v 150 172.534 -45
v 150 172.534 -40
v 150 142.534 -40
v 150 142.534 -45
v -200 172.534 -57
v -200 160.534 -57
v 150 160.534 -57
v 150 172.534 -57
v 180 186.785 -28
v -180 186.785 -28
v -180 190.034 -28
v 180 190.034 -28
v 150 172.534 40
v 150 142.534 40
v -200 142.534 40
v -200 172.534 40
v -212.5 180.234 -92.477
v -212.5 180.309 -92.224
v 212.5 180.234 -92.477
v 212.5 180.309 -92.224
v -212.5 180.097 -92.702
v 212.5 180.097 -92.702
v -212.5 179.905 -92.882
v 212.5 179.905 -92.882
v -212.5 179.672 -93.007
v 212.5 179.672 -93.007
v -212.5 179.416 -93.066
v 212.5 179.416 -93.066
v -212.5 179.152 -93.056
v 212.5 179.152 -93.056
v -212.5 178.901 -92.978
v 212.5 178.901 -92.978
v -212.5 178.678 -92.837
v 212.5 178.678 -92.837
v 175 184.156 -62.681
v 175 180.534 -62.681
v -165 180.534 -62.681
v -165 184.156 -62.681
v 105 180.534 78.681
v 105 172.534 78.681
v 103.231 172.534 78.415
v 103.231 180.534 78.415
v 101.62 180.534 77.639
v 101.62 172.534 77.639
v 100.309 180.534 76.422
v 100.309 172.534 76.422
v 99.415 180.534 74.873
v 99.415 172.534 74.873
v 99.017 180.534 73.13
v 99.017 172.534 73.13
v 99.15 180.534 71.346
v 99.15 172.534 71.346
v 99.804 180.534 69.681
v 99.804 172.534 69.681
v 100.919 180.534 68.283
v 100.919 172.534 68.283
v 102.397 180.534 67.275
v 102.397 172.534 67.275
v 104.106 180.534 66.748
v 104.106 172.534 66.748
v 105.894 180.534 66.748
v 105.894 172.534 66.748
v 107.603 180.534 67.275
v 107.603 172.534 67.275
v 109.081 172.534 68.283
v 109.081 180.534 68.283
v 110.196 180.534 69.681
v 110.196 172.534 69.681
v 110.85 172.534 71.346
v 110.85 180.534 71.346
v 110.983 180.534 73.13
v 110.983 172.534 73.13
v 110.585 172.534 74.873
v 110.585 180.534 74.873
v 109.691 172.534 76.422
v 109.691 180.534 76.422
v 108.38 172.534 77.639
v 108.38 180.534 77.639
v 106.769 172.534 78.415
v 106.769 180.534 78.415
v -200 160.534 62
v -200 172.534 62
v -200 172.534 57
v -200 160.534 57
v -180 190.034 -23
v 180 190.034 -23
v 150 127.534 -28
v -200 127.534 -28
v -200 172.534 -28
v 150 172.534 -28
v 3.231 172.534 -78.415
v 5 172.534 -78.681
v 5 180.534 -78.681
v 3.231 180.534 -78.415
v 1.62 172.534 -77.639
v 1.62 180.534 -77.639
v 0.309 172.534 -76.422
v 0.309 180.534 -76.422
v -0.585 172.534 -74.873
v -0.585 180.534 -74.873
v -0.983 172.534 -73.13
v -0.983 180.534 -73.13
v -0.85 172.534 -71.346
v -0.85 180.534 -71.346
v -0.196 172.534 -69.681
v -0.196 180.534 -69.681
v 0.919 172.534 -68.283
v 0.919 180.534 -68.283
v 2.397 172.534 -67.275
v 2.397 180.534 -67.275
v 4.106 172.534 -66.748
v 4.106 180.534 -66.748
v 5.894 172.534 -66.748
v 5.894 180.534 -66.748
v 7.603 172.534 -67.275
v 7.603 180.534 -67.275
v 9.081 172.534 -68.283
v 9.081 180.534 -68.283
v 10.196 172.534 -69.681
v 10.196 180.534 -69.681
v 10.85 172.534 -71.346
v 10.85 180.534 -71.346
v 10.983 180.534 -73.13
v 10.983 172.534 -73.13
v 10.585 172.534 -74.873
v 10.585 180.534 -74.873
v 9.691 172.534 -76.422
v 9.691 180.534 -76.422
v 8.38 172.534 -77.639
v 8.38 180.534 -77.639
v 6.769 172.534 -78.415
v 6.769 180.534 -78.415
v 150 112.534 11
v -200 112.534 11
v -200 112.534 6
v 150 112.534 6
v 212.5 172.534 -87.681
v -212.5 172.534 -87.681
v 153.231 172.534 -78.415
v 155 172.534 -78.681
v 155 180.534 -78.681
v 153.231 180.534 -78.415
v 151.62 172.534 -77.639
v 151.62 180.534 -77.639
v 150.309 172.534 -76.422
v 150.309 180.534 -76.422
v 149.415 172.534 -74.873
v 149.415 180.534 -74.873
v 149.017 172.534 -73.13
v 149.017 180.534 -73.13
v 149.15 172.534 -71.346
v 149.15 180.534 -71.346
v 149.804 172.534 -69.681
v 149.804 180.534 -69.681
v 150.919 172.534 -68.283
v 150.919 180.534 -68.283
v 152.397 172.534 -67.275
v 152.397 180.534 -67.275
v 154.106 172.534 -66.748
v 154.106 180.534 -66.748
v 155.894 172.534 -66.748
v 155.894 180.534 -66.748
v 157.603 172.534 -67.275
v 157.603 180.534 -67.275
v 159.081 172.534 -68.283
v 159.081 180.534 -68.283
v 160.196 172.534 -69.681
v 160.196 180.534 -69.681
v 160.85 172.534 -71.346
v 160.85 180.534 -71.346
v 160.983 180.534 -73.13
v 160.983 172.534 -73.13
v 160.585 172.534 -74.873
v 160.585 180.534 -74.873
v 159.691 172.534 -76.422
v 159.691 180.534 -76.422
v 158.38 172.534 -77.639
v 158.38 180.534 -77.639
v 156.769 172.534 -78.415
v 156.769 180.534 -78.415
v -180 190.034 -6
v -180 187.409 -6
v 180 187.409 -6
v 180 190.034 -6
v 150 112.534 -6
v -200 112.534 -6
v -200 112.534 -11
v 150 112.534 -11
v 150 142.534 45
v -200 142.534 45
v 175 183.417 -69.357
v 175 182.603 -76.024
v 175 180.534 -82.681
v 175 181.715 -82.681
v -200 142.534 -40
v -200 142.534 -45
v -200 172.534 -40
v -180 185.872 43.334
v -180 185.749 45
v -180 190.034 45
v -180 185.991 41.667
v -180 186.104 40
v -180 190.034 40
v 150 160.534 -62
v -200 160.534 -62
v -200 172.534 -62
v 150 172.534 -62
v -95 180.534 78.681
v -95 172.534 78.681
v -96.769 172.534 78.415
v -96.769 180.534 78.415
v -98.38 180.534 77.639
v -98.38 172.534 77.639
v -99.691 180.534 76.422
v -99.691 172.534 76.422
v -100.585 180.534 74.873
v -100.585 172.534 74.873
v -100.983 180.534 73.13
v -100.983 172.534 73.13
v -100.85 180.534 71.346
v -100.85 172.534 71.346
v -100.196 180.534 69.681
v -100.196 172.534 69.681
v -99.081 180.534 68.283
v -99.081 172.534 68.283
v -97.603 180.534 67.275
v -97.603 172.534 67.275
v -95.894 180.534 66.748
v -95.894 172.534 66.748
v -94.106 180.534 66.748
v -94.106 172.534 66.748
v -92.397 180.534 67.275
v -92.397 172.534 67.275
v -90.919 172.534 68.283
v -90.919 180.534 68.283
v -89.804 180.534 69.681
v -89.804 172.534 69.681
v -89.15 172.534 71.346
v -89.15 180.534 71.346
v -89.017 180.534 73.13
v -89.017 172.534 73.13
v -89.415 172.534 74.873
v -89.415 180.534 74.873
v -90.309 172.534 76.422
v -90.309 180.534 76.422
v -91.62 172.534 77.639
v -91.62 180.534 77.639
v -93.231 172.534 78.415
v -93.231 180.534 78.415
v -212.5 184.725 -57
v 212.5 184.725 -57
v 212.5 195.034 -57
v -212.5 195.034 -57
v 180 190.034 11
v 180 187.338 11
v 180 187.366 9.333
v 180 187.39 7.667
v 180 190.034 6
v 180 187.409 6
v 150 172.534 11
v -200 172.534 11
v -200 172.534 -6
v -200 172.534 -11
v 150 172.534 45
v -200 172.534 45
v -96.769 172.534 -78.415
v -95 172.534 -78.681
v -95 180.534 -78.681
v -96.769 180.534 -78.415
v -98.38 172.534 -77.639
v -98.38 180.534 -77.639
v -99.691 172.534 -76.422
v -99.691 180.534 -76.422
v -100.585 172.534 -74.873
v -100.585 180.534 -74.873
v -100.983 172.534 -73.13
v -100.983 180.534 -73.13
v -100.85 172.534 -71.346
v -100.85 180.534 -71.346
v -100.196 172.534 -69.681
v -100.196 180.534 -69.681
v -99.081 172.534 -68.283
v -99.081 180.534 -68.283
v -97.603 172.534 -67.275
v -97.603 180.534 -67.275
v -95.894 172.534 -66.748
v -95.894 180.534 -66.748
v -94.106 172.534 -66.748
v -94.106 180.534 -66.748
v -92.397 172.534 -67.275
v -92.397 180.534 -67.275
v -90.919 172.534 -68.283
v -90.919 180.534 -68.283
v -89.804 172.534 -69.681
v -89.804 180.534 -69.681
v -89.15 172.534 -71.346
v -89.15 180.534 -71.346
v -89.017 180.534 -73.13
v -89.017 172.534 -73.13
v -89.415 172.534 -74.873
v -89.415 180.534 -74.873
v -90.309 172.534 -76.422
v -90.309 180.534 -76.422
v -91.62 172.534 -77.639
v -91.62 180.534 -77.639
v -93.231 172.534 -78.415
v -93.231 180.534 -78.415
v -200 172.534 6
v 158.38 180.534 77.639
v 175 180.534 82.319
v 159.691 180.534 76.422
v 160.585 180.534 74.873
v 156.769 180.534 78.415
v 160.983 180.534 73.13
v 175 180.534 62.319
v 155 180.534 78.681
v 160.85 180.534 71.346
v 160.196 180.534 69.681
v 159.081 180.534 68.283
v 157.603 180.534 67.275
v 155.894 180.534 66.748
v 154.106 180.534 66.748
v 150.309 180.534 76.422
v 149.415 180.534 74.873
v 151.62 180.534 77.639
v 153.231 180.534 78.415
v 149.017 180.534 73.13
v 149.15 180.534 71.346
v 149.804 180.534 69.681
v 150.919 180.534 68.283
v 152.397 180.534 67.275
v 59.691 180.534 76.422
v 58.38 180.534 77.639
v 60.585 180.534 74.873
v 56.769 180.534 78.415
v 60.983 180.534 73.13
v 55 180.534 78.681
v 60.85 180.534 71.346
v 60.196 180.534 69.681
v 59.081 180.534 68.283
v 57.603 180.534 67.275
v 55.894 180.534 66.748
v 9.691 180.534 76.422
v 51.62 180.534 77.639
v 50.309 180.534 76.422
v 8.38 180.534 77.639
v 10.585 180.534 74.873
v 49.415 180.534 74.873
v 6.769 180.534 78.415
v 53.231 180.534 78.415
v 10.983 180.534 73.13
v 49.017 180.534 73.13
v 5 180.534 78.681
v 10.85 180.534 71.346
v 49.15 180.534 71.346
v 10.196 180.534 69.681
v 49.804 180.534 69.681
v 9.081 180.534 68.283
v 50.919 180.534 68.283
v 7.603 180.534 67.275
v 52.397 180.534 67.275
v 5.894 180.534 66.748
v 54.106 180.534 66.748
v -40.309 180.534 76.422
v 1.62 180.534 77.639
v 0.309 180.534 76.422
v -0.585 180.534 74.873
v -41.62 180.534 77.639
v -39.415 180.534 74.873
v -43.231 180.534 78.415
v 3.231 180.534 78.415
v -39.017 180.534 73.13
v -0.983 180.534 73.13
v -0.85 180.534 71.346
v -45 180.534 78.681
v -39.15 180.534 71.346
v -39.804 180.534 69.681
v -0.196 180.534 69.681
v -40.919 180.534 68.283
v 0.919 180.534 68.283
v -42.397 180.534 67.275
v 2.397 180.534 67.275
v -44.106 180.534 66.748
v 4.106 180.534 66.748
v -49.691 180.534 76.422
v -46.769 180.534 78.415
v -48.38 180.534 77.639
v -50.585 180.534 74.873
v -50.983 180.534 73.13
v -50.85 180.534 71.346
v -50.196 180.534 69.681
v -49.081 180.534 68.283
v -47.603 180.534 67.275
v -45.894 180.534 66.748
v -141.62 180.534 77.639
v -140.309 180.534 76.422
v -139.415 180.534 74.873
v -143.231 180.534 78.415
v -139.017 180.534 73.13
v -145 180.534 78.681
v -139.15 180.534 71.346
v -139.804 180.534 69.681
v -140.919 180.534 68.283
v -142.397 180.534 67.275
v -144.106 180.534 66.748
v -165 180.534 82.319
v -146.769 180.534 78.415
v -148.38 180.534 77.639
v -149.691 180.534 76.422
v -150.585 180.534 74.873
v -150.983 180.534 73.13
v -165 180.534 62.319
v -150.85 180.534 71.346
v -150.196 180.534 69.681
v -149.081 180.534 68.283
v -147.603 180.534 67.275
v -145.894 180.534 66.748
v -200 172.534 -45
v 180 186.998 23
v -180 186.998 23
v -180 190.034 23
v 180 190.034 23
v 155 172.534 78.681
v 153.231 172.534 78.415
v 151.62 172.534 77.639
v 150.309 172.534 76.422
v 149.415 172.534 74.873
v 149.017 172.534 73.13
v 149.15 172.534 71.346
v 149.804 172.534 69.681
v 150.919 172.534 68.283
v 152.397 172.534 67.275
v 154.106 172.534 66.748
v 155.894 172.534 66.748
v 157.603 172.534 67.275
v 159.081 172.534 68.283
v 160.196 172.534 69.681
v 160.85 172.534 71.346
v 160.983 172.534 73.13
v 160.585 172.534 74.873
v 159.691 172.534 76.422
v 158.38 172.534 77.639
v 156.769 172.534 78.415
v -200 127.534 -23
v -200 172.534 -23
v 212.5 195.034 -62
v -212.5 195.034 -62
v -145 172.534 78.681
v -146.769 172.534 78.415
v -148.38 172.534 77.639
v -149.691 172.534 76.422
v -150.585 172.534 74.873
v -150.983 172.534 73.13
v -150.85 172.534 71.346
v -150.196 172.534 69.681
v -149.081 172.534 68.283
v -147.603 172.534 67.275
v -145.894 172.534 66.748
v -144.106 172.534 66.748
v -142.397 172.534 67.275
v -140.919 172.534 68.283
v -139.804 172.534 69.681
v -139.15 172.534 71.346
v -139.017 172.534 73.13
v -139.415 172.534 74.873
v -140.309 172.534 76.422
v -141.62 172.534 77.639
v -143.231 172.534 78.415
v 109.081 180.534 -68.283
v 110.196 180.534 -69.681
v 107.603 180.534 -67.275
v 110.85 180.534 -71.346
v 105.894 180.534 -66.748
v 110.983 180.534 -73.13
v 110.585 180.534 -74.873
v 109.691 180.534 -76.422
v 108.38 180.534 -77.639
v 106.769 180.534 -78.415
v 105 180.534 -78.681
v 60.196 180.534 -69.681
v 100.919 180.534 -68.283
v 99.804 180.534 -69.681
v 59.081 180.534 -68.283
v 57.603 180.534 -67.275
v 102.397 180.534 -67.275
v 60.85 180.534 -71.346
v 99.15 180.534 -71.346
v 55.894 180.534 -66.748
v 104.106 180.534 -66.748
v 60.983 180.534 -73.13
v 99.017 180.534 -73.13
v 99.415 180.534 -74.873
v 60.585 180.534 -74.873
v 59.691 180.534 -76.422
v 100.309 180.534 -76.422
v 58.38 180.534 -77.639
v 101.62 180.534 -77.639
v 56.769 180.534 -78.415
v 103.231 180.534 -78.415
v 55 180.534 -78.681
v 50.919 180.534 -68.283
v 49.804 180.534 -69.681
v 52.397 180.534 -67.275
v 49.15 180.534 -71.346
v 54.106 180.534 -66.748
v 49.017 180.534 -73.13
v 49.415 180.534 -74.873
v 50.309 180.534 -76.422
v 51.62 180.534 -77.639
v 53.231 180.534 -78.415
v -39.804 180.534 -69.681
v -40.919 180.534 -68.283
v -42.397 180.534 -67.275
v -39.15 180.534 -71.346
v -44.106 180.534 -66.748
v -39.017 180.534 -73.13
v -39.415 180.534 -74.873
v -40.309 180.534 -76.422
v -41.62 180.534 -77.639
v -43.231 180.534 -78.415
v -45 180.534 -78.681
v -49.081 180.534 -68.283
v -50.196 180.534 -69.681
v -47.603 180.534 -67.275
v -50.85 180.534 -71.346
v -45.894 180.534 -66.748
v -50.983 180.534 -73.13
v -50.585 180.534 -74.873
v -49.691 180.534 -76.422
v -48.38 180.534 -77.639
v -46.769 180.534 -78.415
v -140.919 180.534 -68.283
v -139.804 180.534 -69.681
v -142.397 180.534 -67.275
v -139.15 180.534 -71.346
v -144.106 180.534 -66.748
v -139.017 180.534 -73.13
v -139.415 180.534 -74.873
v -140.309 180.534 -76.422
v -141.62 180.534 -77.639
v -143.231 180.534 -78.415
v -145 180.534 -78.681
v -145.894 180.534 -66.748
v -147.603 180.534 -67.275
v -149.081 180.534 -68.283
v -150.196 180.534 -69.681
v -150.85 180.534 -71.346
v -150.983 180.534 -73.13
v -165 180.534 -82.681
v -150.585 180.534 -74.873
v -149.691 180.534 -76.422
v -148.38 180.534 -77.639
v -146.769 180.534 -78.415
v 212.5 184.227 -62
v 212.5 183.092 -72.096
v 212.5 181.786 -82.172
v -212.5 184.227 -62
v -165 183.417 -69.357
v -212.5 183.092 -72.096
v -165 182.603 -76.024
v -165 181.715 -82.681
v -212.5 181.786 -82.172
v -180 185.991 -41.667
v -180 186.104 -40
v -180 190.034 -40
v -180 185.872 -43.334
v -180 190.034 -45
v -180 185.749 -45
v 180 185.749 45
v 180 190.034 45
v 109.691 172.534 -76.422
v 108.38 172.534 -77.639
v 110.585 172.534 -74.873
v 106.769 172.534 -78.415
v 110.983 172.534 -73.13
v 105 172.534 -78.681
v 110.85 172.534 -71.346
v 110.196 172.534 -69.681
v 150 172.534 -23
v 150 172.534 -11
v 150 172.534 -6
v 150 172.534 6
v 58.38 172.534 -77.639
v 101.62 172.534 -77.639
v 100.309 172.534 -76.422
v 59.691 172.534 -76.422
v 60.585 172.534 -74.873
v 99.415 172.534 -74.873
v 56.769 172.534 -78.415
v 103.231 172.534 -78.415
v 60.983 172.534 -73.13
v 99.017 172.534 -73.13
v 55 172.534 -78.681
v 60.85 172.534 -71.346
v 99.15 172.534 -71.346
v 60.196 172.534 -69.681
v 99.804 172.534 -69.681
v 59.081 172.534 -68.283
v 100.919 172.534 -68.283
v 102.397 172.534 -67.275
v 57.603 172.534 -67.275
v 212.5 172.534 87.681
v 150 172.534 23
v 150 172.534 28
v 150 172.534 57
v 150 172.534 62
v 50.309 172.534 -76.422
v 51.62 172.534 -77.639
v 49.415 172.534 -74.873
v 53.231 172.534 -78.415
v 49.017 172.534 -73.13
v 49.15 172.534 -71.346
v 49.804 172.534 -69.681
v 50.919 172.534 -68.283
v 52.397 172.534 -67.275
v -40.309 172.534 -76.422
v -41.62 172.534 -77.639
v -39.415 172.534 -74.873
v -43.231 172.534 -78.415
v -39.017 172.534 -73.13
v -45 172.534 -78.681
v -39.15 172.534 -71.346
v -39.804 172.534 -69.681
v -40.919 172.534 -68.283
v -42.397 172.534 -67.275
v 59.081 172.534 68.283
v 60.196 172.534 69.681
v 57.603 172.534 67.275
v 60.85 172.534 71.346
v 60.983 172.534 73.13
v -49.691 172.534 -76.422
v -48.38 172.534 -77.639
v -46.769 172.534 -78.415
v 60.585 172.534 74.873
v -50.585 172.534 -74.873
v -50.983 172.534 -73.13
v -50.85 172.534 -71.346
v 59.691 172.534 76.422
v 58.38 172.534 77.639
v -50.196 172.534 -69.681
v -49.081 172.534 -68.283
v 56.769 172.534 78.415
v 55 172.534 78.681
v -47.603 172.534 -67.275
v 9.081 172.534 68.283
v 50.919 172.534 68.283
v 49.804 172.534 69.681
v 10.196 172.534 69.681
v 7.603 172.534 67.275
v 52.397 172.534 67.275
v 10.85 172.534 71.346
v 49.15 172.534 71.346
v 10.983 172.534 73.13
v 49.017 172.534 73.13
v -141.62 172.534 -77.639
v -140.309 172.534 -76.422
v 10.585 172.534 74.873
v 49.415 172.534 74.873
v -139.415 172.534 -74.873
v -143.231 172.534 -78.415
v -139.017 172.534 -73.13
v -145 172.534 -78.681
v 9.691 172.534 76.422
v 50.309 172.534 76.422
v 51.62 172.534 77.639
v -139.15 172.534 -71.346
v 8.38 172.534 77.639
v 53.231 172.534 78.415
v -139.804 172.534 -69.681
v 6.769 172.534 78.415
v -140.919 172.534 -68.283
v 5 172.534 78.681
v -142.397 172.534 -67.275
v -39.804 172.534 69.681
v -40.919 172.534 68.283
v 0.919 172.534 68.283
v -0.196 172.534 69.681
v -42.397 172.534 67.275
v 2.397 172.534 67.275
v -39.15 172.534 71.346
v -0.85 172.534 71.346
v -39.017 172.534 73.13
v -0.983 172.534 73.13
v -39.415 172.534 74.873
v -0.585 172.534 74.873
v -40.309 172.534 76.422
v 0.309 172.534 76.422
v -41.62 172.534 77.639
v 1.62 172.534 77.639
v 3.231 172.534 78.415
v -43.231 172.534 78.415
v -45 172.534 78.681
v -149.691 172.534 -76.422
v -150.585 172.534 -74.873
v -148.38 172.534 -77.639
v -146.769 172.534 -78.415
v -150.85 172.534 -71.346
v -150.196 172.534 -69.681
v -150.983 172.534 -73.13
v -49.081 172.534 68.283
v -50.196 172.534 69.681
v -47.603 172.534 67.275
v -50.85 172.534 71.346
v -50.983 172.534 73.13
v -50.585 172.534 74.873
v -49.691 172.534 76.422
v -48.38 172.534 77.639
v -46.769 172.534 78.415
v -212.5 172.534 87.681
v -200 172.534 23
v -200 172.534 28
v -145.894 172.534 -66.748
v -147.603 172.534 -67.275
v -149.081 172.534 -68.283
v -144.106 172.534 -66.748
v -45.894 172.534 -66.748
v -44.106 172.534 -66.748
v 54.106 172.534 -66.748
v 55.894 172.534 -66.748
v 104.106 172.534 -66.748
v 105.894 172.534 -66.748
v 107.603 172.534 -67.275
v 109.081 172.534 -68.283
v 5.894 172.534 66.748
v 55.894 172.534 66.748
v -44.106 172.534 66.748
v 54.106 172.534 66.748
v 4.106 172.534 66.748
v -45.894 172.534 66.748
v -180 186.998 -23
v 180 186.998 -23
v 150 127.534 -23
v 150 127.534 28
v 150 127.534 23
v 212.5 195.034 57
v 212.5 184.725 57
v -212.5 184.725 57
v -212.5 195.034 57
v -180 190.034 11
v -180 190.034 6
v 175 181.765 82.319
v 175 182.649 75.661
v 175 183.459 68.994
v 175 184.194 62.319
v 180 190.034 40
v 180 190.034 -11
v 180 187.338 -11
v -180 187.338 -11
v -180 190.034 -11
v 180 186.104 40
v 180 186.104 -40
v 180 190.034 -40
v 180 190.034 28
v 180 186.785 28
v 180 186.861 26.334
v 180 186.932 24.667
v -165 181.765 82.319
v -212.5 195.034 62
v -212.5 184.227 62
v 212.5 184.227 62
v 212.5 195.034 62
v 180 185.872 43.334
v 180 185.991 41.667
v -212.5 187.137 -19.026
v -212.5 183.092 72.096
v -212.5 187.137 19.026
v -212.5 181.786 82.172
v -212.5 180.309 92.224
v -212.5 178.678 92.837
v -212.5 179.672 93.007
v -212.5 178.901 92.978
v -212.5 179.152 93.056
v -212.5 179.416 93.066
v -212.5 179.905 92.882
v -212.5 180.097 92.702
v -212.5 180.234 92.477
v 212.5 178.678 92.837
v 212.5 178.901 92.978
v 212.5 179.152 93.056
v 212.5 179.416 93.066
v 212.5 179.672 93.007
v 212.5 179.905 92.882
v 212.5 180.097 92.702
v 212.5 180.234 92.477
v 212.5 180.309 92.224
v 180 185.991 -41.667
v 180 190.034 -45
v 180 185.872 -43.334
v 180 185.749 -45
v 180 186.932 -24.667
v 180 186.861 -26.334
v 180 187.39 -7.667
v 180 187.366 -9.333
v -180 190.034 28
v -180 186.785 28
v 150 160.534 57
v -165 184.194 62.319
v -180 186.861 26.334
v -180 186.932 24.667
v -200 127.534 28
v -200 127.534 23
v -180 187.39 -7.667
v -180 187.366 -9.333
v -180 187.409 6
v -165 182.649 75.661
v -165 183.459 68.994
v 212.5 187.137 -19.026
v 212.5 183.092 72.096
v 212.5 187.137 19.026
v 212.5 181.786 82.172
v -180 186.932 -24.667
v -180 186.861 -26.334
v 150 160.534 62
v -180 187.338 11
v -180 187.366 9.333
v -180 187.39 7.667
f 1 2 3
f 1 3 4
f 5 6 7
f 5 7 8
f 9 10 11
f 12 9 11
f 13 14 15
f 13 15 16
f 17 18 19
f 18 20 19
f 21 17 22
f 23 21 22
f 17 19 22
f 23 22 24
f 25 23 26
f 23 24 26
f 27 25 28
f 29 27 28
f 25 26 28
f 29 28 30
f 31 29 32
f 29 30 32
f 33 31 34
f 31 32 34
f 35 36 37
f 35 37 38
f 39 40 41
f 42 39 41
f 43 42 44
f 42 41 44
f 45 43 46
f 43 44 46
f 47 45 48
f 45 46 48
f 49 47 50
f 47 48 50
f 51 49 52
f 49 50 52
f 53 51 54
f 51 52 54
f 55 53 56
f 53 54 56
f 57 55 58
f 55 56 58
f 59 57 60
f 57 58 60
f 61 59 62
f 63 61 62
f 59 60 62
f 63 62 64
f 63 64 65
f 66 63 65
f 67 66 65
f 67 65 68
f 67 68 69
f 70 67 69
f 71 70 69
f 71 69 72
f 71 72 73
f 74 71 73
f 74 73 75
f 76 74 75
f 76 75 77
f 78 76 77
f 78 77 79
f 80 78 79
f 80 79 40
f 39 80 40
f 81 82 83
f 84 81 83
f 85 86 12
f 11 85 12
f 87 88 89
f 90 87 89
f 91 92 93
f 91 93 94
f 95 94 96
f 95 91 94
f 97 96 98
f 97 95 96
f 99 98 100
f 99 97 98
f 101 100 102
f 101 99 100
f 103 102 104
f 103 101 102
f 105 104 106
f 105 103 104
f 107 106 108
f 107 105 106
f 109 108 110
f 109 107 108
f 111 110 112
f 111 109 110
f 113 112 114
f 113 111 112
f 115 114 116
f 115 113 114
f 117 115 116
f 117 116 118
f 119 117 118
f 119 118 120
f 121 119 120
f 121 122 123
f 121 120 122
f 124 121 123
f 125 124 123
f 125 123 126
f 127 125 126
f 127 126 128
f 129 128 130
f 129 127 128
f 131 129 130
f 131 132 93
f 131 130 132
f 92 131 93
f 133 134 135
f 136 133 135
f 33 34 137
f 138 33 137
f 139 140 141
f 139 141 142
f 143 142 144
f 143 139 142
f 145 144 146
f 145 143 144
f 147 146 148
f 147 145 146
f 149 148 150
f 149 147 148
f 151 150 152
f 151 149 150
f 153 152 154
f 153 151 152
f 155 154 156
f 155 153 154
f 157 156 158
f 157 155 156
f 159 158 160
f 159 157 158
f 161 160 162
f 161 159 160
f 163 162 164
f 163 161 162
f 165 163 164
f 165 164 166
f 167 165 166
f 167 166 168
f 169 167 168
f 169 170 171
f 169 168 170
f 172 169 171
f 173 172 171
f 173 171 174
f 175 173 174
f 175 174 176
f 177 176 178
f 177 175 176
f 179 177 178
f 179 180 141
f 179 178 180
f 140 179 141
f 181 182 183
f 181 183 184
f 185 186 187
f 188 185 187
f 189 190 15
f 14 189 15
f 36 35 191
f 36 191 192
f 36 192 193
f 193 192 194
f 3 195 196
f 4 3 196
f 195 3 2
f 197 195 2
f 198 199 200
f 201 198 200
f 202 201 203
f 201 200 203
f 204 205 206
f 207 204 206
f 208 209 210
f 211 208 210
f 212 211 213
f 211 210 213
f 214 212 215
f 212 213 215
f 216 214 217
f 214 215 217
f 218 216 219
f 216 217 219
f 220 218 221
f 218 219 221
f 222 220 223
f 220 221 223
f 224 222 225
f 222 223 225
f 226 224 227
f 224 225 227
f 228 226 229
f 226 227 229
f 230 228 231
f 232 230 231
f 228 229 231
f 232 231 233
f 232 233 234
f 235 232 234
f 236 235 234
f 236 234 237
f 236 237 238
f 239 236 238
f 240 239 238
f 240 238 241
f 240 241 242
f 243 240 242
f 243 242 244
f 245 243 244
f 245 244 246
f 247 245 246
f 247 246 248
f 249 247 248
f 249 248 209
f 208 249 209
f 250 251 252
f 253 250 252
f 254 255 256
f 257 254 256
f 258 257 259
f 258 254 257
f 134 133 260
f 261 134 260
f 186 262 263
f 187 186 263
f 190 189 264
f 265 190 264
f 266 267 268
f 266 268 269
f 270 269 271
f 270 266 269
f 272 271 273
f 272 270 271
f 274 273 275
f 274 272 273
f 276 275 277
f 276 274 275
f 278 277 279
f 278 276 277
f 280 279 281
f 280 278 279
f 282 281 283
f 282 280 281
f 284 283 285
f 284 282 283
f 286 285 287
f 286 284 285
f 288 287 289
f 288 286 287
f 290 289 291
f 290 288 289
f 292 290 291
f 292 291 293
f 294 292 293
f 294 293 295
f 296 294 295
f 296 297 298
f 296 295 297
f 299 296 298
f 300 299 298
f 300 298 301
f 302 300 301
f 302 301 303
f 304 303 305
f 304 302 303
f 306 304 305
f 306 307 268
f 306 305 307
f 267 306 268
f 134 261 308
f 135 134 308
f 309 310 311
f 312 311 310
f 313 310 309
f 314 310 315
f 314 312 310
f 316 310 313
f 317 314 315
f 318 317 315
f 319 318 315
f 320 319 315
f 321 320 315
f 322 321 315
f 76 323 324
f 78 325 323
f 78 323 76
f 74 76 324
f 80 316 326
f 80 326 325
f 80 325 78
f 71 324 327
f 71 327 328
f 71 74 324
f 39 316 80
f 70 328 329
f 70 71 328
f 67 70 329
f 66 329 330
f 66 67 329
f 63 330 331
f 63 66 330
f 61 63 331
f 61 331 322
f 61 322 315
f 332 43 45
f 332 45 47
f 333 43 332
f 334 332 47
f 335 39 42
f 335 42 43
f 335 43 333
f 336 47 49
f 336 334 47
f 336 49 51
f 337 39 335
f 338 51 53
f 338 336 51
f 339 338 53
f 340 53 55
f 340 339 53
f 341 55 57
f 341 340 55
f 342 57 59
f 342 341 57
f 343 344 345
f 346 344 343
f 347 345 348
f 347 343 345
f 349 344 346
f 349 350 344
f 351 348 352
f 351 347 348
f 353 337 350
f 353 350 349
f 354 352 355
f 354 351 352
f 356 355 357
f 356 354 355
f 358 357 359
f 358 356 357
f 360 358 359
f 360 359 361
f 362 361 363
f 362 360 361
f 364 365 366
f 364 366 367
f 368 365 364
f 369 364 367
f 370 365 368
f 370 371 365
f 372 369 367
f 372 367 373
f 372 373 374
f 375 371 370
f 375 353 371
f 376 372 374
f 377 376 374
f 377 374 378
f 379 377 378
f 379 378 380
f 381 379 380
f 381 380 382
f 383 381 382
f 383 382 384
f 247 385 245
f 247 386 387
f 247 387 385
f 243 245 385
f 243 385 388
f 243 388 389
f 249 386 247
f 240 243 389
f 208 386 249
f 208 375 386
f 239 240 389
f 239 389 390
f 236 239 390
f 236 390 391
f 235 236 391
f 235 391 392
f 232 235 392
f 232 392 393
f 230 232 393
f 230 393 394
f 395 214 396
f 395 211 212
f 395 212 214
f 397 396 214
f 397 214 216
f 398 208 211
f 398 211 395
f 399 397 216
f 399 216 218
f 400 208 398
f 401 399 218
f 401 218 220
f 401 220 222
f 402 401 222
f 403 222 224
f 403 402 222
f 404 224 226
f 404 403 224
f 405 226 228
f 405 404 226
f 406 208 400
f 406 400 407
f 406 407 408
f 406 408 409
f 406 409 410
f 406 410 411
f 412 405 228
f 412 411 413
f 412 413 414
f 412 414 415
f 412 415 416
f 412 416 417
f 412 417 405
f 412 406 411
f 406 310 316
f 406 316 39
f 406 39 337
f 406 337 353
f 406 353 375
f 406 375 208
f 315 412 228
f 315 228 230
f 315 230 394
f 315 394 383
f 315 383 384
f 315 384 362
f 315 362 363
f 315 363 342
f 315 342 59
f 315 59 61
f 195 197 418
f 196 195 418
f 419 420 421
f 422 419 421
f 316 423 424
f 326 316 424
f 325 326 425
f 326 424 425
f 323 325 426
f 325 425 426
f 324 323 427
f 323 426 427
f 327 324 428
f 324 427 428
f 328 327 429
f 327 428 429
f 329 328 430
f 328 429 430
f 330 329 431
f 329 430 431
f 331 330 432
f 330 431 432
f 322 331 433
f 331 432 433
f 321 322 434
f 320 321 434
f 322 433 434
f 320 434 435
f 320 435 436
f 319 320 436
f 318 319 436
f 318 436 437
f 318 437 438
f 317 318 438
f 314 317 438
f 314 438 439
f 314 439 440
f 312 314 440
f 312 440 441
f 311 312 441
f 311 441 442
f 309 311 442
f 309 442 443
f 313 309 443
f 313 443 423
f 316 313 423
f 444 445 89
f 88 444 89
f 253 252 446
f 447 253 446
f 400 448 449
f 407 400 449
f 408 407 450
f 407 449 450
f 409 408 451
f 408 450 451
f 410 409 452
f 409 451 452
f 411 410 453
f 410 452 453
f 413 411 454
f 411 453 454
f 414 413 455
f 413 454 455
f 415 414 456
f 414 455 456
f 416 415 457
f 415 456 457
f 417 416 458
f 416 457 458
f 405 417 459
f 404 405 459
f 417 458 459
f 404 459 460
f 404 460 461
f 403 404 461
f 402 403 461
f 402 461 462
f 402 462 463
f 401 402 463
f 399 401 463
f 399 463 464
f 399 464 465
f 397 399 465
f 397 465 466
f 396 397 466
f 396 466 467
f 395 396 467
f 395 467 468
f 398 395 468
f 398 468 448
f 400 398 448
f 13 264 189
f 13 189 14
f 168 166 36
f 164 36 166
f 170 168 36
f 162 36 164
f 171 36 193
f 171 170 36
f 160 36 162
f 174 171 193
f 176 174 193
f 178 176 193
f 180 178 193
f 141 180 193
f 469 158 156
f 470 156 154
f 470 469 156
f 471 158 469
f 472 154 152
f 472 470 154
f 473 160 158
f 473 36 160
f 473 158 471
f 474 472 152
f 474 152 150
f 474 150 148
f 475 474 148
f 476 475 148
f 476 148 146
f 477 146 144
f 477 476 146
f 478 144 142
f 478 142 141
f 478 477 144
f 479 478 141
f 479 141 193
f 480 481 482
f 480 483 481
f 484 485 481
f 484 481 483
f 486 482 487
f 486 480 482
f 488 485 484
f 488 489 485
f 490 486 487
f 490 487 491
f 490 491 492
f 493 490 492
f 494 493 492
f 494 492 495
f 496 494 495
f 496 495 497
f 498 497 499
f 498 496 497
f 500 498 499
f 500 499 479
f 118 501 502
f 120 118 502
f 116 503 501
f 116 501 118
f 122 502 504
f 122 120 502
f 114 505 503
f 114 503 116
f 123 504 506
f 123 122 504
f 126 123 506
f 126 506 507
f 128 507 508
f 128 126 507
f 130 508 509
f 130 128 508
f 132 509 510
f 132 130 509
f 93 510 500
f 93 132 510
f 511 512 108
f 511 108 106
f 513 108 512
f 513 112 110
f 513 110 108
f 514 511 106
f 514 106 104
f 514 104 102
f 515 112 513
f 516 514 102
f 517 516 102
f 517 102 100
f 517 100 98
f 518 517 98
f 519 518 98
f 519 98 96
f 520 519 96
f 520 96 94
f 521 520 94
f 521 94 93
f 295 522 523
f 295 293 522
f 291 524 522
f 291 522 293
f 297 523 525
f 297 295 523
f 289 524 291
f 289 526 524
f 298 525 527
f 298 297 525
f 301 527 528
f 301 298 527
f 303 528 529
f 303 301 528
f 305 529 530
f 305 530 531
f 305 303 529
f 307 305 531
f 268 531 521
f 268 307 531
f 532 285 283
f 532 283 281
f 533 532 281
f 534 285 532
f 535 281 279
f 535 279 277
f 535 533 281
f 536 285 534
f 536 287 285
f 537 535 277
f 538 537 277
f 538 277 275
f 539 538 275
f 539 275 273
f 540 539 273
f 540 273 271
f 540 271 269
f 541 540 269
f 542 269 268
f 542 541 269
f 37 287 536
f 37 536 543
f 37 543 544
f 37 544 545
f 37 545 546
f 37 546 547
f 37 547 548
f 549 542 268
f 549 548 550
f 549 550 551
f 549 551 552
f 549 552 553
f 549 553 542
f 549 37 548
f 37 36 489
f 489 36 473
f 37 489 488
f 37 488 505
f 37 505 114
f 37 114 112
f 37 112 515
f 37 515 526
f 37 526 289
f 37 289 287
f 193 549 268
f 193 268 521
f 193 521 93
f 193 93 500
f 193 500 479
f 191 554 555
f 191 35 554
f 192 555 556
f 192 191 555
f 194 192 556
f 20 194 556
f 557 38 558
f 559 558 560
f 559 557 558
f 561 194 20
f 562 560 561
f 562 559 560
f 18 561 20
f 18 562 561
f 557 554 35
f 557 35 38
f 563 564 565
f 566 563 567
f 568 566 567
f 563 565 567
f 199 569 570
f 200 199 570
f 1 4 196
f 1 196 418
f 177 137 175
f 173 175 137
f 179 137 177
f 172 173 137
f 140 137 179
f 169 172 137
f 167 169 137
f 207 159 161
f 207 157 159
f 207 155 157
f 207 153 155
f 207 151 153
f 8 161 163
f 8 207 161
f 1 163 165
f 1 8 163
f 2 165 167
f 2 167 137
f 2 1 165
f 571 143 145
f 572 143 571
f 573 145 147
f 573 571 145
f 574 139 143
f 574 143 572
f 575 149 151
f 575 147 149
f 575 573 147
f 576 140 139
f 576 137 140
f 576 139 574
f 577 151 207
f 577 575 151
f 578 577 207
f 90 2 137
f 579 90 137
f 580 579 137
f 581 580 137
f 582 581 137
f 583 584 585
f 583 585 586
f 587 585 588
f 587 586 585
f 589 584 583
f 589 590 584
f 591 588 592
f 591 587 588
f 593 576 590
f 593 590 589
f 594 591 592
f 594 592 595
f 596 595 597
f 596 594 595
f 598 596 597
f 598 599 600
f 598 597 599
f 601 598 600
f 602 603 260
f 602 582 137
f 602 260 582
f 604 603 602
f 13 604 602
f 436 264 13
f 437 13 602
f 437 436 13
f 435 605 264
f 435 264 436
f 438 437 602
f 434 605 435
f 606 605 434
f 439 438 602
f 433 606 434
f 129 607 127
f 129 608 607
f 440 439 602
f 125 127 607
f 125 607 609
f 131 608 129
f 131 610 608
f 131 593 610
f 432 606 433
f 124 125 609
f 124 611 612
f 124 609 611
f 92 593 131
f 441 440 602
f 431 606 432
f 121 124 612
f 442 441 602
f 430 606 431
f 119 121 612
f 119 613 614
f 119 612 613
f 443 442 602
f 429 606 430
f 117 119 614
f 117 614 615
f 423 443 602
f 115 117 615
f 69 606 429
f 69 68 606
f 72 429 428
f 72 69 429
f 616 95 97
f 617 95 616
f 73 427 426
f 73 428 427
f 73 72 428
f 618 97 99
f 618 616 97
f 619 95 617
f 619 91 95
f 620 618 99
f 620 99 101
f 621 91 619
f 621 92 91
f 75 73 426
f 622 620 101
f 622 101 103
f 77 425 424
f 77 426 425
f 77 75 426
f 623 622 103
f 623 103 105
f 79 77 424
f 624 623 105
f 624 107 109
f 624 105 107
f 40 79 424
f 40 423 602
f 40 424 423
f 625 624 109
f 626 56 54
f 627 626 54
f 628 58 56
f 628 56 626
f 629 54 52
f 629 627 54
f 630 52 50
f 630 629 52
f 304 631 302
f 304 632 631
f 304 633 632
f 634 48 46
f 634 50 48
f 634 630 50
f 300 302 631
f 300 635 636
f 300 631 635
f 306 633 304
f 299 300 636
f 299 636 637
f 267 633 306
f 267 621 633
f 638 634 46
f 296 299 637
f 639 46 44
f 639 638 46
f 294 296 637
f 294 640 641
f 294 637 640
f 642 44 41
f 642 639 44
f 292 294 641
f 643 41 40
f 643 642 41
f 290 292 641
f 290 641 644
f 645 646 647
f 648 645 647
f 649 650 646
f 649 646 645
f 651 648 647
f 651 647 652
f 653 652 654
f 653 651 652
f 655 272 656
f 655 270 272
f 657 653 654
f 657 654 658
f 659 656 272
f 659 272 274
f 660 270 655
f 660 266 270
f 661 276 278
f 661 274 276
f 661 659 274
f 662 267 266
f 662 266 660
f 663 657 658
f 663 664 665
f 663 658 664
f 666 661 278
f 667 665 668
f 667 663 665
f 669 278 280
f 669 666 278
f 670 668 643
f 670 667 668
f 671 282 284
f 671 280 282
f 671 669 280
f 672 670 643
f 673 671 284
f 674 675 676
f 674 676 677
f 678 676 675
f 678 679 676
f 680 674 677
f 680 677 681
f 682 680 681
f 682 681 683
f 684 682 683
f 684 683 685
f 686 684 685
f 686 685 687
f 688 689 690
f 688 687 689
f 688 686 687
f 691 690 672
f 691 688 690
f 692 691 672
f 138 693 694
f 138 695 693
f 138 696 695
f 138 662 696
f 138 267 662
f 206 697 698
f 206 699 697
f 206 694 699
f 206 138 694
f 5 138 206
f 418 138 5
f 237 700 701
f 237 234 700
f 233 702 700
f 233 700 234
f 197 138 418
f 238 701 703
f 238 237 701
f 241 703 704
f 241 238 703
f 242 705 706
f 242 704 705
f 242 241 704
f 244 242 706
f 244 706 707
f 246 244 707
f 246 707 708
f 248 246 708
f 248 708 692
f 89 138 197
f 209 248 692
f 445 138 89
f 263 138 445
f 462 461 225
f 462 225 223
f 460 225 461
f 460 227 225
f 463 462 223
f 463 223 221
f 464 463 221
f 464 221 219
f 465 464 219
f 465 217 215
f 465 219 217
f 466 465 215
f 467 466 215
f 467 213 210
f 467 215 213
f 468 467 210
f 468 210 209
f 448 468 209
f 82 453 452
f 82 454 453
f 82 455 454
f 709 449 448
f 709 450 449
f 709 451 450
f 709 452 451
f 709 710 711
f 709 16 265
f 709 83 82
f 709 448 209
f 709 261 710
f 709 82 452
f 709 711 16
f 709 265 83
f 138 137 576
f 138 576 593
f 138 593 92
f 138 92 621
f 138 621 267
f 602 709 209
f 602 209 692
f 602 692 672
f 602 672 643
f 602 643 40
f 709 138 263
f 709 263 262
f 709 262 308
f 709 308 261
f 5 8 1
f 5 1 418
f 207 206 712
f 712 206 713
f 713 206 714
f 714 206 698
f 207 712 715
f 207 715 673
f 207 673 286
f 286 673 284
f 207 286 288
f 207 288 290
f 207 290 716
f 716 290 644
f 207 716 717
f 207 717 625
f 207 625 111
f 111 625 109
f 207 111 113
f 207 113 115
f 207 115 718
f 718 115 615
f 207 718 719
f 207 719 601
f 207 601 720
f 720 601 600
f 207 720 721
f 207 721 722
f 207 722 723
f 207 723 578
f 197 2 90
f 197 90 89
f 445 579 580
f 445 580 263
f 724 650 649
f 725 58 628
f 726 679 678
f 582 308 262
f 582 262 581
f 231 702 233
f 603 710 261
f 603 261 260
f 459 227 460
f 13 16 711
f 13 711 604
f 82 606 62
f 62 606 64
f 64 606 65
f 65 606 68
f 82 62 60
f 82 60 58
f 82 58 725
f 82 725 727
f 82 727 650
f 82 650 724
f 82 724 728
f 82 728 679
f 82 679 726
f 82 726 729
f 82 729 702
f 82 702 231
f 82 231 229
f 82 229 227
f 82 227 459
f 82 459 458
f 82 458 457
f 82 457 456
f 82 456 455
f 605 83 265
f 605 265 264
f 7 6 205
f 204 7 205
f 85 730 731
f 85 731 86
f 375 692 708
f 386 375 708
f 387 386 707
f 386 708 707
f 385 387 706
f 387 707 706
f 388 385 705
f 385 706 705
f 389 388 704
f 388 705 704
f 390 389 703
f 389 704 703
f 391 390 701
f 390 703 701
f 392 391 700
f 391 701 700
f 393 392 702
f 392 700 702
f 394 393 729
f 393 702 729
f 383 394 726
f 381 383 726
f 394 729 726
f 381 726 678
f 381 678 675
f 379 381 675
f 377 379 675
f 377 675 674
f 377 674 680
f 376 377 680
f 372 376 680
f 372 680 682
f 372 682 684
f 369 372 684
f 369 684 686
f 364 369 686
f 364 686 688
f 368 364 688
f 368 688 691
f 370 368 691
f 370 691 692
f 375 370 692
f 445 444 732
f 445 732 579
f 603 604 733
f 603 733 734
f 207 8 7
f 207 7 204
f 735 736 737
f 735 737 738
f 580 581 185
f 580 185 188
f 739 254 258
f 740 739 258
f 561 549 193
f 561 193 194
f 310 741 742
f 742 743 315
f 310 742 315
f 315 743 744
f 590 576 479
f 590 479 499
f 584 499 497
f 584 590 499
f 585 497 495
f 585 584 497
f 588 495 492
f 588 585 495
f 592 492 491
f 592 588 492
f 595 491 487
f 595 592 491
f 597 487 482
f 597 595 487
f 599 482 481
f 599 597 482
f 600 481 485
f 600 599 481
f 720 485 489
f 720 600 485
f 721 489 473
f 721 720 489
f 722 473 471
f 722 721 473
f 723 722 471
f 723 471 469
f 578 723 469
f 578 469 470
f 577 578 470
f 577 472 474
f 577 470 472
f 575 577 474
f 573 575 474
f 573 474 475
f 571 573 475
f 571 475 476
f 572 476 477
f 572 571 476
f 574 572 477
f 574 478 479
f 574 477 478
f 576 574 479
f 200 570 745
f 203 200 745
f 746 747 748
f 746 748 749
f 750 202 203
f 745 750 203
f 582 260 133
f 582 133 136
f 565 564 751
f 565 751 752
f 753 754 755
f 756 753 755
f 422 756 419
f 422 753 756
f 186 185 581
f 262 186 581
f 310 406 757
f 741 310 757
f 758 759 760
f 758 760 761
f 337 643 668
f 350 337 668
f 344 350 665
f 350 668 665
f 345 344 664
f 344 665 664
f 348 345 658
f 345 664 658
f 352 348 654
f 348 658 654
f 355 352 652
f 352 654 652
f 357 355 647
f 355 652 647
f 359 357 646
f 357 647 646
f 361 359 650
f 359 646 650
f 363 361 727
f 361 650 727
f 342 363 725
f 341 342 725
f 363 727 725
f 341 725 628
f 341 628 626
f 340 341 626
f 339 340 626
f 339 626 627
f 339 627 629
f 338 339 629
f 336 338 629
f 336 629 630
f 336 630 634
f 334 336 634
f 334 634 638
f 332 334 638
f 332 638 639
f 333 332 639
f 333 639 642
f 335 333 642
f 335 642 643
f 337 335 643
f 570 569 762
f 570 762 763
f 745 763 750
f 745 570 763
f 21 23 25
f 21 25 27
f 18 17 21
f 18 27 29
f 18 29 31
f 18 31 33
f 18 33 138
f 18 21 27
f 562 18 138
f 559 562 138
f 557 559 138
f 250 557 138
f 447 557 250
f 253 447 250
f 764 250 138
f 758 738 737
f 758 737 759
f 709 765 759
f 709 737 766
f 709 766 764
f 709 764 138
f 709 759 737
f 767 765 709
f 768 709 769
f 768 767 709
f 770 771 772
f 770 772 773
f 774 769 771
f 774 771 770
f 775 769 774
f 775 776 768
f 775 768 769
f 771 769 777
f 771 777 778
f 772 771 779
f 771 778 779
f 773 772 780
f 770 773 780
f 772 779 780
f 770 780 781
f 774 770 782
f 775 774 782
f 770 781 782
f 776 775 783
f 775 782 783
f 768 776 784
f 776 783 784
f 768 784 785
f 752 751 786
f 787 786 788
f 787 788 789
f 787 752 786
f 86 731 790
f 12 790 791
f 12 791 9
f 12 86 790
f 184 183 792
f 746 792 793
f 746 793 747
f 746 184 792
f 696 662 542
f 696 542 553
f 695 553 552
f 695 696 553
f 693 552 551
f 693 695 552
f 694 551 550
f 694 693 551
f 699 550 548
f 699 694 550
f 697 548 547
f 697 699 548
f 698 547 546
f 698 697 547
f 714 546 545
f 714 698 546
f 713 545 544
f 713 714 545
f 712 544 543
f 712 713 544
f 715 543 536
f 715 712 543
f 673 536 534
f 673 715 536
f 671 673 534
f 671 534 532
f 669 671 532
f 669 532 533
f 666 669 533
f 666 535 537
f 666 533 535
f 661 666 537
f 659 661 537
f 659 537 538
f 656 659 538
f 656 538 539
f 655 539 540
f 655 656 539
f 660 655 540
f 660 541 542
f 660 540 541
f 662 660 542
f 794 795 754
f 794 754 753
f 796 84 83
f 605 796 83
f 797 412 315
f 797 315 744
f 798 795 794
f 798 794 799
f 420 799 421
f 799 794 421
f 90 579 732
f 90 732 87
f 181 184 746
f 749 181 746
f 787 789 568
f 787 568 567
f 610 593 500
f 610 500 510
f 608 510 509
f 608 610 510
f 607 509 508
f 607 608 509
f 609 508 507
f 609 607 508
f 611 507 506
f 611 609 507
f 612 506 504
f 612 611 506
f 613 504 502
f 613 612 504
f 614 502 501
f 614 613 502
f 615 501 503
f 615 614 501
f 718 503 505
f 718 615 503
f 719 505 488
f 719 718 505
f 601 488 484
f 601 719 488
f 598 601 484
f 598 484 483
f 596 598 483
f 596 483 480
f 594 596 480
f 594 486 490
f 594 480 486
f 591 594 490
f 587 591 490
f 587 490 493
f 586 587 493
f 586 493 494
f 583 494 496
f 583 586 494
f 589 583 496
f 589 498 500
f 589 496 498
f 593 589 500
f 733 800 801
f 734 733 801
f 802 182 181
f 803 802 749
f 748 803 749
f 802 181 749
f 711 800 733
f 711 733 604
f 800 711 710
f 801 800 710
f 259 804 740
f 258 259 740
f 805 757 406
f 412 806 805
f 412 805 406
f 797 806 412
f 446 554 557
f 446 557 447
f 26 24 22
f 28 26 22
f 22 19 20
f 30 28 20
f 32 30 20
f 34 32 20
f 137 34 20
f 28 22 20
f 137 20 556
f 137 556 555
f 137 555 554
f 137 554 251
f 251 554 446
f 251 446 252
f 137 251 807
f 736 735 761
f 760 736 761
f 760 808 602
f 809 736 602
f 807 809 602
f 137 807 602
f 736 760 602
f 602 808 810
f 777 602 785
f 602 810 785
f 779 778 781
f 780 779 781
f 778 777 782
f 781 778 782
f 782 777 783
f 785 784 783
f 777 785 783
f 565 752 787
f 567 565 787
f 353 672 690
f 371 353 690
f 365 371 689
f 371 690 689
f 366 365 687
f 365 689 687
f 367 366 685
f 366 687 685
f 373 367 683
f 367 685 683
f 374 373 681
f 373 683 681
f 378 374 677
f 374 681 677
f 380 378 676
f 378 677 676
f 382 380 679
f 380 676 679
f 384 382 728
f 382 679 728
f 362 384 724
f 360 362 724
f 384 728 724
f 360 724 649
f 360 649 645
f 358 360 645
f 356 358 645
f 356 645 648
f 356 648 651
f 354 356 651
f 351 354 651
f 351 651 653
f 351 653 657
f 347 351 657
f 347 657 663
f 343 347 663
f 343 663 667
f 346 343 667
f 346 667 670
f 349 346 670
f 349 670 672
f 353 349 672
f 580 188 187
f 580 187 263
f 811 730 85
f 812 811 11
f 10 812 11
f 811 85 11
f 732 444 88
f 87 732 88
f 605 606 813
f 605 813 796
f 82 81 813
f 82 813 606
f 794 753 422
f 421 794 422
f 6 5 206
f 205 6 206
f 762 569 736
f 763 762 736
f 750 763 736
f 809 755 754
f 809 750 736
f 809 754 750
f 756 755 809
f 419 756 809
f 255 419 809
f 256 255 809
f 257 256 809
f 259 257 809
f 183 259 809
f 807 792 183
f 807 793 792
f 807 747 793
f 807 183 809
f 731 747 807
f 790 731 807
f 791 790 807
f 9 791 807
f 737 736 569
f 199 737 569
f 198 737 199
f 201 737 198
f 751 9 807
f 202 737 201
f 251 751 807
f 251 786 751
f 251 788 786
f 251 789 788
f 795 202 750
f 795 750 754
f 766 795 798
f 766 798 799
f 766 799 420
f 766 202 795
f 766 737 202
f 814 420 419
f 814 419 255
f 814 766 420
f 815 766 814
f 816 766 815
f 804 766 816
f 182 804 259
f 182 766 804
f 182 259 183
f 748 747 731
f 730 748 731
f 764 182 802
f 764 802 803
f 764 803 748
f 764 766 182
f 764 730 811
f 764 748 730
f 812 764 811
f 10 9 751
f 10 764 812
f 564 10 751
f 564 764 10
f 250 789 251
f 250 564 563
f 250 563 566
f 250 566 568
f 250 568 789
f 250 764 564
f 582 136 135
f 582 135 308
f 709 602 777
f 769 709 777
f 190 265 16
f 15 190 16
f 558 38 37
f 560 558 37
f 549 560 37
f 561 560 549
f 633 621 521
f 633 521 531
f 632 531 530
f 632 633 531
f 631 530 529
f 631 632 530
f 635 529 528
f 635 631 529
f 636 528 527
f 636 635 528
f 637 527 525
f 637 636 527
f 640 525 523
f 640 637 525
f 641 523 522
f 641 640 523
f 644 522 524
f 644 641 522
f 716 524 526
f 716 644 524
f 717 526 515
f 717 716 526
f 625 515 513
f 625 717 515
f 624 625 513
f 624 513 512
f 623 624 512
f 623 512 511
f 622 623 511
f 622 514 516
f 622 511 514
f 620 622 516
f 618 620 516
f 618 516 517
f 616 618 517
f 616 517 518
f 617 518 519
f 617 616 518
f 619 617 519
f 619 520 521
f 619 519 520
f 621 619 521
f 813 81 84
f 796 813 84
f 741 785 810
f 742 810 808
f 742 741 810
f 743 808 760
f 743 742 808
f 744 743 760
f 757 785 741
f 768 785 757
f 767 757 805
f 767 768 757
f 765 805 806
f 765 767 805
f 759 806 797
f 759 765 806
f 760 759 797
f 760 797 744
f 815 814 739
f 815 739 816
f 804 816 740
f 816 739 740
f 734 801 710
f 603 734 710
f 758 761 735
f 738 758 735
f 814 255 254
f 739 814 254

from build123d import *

# Parameters (mm, degrees)
BOSS_EXTRUDE1_DEPTH             = 212.5
BOSS_EXTRUDE1_DEPTH_BACK        = 212.5
SKETCH3_R                       = 6
CUT_EXTRUDE1_DEPTH              = 299.531180557
FILLET1_R                       = 1
BOSS_EXTRUDE2_DEPTH             = 150
BOSS_EXTRUDE2_DEPTH_BACK        = 200
SKETCH4_W                       = 5
SKETCH4_H                       = 12
SKETCH4_H_2                     = 30
SKETCH4_H_3                     = 45
SKETCH4_H_4                     = 60
BOSS_EXTRUDE3_REACH             = 300.248
SKETCH5_W                       = 5
SKETCH5_H                       = 15
BOSS_EXTRUDE3_DIRECTION_2_REACH = 300.248
BOSS_EXTRUDE4_DEPTH             = 180
BOSS_EXTRUDE4_DEPTH_BACK        = 180
SKETCH6_W                       = 5
SKETCH6_H                       = 10
CUT_EXTRUDE2_DEPTH              = 175
CUT_EXTRUDE2_DEPTH_BACK         = 165
SKETCH7_W                       = 20
SKETCH7_H                       = 7


with BuildPart() as part:
    # Sketch2 → Boss-Extrude1 (new, two sides: drawn at the far end of the back side and taken through both)
    with BuildSketch(Plane(origin=(0, 0, 0), x_dir=(0, 0, -1), z_dir=(1, 0, 0)).offset(-BOSS_EXTRUDE1_DEPTH_BACK)):
        with BuildLine():
            Line((-87.681240867, 172.53405461), (-93.974488101, 180.03405461))
            ThreePointArc((-93.974488101, 180.03405461), (0, 187.439087042), (93.974488101, 180.03405461))
            Line((93.974488101, 180.03405461), (87.681240867, 172.53405461))
            Line((87.681240867, 172.53405461), (-87.681240867, 172.53405461))
        make_face()
    extrude(amount=BOSS_EXTRUDE1_DEPTH + BOSS_EXTRUDE1_DEPTH_BACK)

    # Sketch3 → Cut-Extrude1 (cut, through all)
    with BuildSketch(Plane(origin=(0, 0, 0), x_dir=(1, 0, 0), z_dir=(0, 1, 0))):
        with Locations((-145, 72.681240867)):
            Circle(SKETCH3_R)
        with Locations((-95, 72.681240867)):
            Circle(SKETCH3_R)
        with Locations((-45, 72.681240867)):
            Circle(SKETCH3_R)
        with Locations((5, 72.681240867)):
            Circle(SKETCH3_R)
        with Locations((55, 72.681240867)):
            Circle(SKETCH3_R)
        with Locations((105, 72.681240867)):
            Circle(SKETCH3_R)
        with Locations((155, 72.681240867)):
            Circle(SKETCH3_R)
    cut_extrude1 = extrude(amount=CUT_EXTRUDE1_DEPTH, mode=Mode.SUBTRACT)

    # Mirror1: Cut-Extrude1 across plane
    add(cut_extrude1.mirror(Plane.XY), mode=Mode.SUBTRACT)

    # Fillet1
    fillet1_edges = [part.edges().sort_by_distance(p)[0] for p in [
        (0, 180.03405461, -93.974488101),
        (0, 180.03405461, 93.974488101),
    ]]
    fillet(fillet1_edges, radius=FILLET1_R)

    # Sketch4 → Boss-Extrude2 (add, two sides: drawn at the far end of the back side and taken through both)
    with BuildSketch(Plane(origin=(0, 0, 0), x_dir=(0, 0, -1), z_dir=(1, 0, 0)).offset(-BOSS_EXTRUDE2_DEPTH_BACK)):
        with Locations((-59.5, 166.53405461)):
            Rectangle(SKETCH4_W, SKETCH4_H)
        with Locations((-42.5, 157.53405461)):
            Rectangle(SKETCH4_W, SKETCH4_H_2)
        with Locations((-25.5, 150.03405461)):
            Rectangle(SKETCH4_W, SKETCH4_H_3)
        with Locations((-8.5, 142.53405461)):
            Rectangle(SKETCH4_W, SKETCH4_H_4)
        with Locations((8.5, 142.53405461)):
            Rectangle(SKETCH4_W, SKETCH4_H_4)
        with Locations((25.5, 150.03405461)):
            Rectangle(SKETCH4_W, SKETCH4_H_3)
        with Locations((59.5, 166.53405461)):
            Rectangle(SKETCH4_W, SKETCH4_H)
        with Locations((42.5, 157.53405461)):
            Rectangle(SKETCH4_W, SKETCH4_H_2)
    extrude(amount=BOSS_EXTRUDE2_DEPTH + BOSS_EXTRUDE2_DEPTH_BACK)

    # Boss-Extrude3: up to this face of the body (flat: up to its plane)
    boss_extrude3_end = Plane(part.part.faces().sort_by_distance((212.5, 179.031198014, 0))[0])
    # Sketch5 → Boss-Extrude3 (add, up to the picked face)
    with BuildSketch(Plane(origin=(0, 0, 0), x_dir=(0, 0, -1), z_dir=(1, 0, 0)), mode=Mode.PRIVATE) as boss_extrude3_sk1:
        with Locations((-59.5, 187.53405461)):
            Rectangle(SKETCH5_W, SKETCH5_H)
    boss_extrude3_tool1 = split(extrude(boss_extrude3_sk1.sketch, amount=BOSS_EXTRUDE3_REACH, mode=Mode.PRIVATE), bisect_by=boss_extrude3_end, keep=Keep.BOTH, mode=Mode.PRIVATE)
    # Sketch5 → Boss-Extrude3 (add, up to the picked face)
    with BuildSketch(Plane(origin=(0, 0, 0), x_dir=(0, 0, -1), z_dir=(1, 0, 0)), mode=Mode.PRIVATE) as boss_extrude3_sk2:
        with Locations((59.5, 187.53405461)):
            Rectangle(SKETCH5_W, SKETCH5_H)
    boss_extrude3_tool2 = split(extrude(boss_extrude3_sk2.sketch, amount=BOSS_EXTRUDE3_REACH, mode=Mode.PRIVATE), bisect_by=boss_extrude3_end, keep=Keep.BOTH, mode=Mode.PRIVATE)
    add(boss_extrude3_tool1.solids().sort_by(Axis((0, 187.534055, 59.5), (1, 0, 0)))[0])
    add(boss_extrude3_tool2.solids().sort_by(Axis((0, 187.534055, -59.5), (1, 0, 0)))[0])

    # Boss-Extrude3 direction 2: up to this face of the body (flat: up to its plane)
    boss_extrude3_direction_2_end = Plane(part.part.faces().sort_by_distance((-212.5, 179.031198014, 0))[0])
    # Sketch5 → Boss-Extrude3 direction 2 (add, up to the picked face)
    with BuildSketch(Plane(origin=(0, 0, 0), x_dir=(0, 0, -1), z_dir=(1, 0, 0)), mode=Mode.PRIVATE) as boss_extrude3_direction_2_sk1:
        with Locations((-59.5, 187.53405461)):
            Rectangle(SKETCH5_W, SKETCH5_H)
    boss_extrude3_direction_2_tool1 = split(extrude(boss_extrude3_direction_2_sk1.sketch, amount=-BOSS_EXTRUDE3_DIRECTION_2_REACH, mode=Mode.PRIVATE), bisect_by=boss_extrude3_direction_2_end, keep=Keep.BOTH, mode=Mode.PRIVATE)
    # Sketch5 → Boss-Extrude3 direction 2 (add, up to the picked face)
    with BuildSketch(Plane(origin=(0, 0, 0), x_dir=(0, 0, -1), z_dir=(1, 0, 0)), mode=Mode.PRIVATE) as boss_extrude3_direction_2_sk2:
        with Locations((59.5, 187.53405461)):
            Rectangle(SKETCH5_W, SKETCH5_H)
    boss_extrude3_direction_2_tool2 = split(extrude(boss_extrude3_direction_2_sk2.sketch, amount=-BOSS_EXTRUDE3_DIRECTION_2_REACH, mode=Mode.PRIVATE), bisect_by=boss_extrude3_direction_2_end, keep=Keep.BOTH, mode=Mode.PRIVATE)
    add(boss_extrude3_direction_2_tool1.solids().sort_by(Axis((0, 187.534055, 59.5), (-1, 0, 0)))[0])
    add(boss_extrude3_direction_2_tool2.solids().sort_by(Axis((0, 187.534055, -59.5), (-1, 0, 0)))[0])

    # Sketch6 → Boss-Extrude4 (add, two sides: drawn at the far end of the back side and taken through both)
    with BuildSketch(Plane(origin=(0, 0, 0), x_dir=(0, 0, -1), z_dir=(1, 0, 0)).offset(-BOSS_EXTRUDE4_DEPTH_BACK)):
        with Locations((-42.5, 185.03405461)):
            Rectangle(SKETCH6_W, SKETCH6_H)
        with Locations((-25.5, 185.03405461)):
            Rectangle(SKETCH6_W, SKETCH6_H)
        with Locations((-8.5, 185.03405461)):
            Rectangle(SKETCH6_W, SKETCH6_H)
        with Locations((8.5, 185.03405461)):
            Rectangle(SKETCH6_W, SKETCH6_H)
        with Locations((25.5, 185.03405461)):
            Rectangle(SKETCH6_W, SKETCH6_H)
        with Locations((42.5, 185.03405461)):
            Rectangle(SKETCH6_W, SKETCH6_H)
    extrude(amount=BOSS_EXTRUDE4_DEPTH + BOSS_EXTRUDE4_DEPTH_BACK)

    # Sketch7 → Cut-Extrude2 (cut, two sides: drawn at the far end of the back side and taken through both)
    with BuildSketch(Plane(origin=(0, 0, 0), x_dir=(0, 0, -1), z_dir=(1, 0, 0)).offset(-CUT_EXTRUDE2_DEPTH_BACK)):
        with Locations((-72.318759133, 184.03405461)):
            Rectangle(SKETCH7_W, SKETCH7_H)
        with Locations((72.681240867, 184.03405461)):
            Rectangle(SKETCH7_W, SKETCH7_H)
    extrude(amount=CUT_EXTRUDE2_DEPTH + CUT_EXTRUDE2_DEPTH_BACK, mode=Mode.SUBTRACT)


solid = part.part
